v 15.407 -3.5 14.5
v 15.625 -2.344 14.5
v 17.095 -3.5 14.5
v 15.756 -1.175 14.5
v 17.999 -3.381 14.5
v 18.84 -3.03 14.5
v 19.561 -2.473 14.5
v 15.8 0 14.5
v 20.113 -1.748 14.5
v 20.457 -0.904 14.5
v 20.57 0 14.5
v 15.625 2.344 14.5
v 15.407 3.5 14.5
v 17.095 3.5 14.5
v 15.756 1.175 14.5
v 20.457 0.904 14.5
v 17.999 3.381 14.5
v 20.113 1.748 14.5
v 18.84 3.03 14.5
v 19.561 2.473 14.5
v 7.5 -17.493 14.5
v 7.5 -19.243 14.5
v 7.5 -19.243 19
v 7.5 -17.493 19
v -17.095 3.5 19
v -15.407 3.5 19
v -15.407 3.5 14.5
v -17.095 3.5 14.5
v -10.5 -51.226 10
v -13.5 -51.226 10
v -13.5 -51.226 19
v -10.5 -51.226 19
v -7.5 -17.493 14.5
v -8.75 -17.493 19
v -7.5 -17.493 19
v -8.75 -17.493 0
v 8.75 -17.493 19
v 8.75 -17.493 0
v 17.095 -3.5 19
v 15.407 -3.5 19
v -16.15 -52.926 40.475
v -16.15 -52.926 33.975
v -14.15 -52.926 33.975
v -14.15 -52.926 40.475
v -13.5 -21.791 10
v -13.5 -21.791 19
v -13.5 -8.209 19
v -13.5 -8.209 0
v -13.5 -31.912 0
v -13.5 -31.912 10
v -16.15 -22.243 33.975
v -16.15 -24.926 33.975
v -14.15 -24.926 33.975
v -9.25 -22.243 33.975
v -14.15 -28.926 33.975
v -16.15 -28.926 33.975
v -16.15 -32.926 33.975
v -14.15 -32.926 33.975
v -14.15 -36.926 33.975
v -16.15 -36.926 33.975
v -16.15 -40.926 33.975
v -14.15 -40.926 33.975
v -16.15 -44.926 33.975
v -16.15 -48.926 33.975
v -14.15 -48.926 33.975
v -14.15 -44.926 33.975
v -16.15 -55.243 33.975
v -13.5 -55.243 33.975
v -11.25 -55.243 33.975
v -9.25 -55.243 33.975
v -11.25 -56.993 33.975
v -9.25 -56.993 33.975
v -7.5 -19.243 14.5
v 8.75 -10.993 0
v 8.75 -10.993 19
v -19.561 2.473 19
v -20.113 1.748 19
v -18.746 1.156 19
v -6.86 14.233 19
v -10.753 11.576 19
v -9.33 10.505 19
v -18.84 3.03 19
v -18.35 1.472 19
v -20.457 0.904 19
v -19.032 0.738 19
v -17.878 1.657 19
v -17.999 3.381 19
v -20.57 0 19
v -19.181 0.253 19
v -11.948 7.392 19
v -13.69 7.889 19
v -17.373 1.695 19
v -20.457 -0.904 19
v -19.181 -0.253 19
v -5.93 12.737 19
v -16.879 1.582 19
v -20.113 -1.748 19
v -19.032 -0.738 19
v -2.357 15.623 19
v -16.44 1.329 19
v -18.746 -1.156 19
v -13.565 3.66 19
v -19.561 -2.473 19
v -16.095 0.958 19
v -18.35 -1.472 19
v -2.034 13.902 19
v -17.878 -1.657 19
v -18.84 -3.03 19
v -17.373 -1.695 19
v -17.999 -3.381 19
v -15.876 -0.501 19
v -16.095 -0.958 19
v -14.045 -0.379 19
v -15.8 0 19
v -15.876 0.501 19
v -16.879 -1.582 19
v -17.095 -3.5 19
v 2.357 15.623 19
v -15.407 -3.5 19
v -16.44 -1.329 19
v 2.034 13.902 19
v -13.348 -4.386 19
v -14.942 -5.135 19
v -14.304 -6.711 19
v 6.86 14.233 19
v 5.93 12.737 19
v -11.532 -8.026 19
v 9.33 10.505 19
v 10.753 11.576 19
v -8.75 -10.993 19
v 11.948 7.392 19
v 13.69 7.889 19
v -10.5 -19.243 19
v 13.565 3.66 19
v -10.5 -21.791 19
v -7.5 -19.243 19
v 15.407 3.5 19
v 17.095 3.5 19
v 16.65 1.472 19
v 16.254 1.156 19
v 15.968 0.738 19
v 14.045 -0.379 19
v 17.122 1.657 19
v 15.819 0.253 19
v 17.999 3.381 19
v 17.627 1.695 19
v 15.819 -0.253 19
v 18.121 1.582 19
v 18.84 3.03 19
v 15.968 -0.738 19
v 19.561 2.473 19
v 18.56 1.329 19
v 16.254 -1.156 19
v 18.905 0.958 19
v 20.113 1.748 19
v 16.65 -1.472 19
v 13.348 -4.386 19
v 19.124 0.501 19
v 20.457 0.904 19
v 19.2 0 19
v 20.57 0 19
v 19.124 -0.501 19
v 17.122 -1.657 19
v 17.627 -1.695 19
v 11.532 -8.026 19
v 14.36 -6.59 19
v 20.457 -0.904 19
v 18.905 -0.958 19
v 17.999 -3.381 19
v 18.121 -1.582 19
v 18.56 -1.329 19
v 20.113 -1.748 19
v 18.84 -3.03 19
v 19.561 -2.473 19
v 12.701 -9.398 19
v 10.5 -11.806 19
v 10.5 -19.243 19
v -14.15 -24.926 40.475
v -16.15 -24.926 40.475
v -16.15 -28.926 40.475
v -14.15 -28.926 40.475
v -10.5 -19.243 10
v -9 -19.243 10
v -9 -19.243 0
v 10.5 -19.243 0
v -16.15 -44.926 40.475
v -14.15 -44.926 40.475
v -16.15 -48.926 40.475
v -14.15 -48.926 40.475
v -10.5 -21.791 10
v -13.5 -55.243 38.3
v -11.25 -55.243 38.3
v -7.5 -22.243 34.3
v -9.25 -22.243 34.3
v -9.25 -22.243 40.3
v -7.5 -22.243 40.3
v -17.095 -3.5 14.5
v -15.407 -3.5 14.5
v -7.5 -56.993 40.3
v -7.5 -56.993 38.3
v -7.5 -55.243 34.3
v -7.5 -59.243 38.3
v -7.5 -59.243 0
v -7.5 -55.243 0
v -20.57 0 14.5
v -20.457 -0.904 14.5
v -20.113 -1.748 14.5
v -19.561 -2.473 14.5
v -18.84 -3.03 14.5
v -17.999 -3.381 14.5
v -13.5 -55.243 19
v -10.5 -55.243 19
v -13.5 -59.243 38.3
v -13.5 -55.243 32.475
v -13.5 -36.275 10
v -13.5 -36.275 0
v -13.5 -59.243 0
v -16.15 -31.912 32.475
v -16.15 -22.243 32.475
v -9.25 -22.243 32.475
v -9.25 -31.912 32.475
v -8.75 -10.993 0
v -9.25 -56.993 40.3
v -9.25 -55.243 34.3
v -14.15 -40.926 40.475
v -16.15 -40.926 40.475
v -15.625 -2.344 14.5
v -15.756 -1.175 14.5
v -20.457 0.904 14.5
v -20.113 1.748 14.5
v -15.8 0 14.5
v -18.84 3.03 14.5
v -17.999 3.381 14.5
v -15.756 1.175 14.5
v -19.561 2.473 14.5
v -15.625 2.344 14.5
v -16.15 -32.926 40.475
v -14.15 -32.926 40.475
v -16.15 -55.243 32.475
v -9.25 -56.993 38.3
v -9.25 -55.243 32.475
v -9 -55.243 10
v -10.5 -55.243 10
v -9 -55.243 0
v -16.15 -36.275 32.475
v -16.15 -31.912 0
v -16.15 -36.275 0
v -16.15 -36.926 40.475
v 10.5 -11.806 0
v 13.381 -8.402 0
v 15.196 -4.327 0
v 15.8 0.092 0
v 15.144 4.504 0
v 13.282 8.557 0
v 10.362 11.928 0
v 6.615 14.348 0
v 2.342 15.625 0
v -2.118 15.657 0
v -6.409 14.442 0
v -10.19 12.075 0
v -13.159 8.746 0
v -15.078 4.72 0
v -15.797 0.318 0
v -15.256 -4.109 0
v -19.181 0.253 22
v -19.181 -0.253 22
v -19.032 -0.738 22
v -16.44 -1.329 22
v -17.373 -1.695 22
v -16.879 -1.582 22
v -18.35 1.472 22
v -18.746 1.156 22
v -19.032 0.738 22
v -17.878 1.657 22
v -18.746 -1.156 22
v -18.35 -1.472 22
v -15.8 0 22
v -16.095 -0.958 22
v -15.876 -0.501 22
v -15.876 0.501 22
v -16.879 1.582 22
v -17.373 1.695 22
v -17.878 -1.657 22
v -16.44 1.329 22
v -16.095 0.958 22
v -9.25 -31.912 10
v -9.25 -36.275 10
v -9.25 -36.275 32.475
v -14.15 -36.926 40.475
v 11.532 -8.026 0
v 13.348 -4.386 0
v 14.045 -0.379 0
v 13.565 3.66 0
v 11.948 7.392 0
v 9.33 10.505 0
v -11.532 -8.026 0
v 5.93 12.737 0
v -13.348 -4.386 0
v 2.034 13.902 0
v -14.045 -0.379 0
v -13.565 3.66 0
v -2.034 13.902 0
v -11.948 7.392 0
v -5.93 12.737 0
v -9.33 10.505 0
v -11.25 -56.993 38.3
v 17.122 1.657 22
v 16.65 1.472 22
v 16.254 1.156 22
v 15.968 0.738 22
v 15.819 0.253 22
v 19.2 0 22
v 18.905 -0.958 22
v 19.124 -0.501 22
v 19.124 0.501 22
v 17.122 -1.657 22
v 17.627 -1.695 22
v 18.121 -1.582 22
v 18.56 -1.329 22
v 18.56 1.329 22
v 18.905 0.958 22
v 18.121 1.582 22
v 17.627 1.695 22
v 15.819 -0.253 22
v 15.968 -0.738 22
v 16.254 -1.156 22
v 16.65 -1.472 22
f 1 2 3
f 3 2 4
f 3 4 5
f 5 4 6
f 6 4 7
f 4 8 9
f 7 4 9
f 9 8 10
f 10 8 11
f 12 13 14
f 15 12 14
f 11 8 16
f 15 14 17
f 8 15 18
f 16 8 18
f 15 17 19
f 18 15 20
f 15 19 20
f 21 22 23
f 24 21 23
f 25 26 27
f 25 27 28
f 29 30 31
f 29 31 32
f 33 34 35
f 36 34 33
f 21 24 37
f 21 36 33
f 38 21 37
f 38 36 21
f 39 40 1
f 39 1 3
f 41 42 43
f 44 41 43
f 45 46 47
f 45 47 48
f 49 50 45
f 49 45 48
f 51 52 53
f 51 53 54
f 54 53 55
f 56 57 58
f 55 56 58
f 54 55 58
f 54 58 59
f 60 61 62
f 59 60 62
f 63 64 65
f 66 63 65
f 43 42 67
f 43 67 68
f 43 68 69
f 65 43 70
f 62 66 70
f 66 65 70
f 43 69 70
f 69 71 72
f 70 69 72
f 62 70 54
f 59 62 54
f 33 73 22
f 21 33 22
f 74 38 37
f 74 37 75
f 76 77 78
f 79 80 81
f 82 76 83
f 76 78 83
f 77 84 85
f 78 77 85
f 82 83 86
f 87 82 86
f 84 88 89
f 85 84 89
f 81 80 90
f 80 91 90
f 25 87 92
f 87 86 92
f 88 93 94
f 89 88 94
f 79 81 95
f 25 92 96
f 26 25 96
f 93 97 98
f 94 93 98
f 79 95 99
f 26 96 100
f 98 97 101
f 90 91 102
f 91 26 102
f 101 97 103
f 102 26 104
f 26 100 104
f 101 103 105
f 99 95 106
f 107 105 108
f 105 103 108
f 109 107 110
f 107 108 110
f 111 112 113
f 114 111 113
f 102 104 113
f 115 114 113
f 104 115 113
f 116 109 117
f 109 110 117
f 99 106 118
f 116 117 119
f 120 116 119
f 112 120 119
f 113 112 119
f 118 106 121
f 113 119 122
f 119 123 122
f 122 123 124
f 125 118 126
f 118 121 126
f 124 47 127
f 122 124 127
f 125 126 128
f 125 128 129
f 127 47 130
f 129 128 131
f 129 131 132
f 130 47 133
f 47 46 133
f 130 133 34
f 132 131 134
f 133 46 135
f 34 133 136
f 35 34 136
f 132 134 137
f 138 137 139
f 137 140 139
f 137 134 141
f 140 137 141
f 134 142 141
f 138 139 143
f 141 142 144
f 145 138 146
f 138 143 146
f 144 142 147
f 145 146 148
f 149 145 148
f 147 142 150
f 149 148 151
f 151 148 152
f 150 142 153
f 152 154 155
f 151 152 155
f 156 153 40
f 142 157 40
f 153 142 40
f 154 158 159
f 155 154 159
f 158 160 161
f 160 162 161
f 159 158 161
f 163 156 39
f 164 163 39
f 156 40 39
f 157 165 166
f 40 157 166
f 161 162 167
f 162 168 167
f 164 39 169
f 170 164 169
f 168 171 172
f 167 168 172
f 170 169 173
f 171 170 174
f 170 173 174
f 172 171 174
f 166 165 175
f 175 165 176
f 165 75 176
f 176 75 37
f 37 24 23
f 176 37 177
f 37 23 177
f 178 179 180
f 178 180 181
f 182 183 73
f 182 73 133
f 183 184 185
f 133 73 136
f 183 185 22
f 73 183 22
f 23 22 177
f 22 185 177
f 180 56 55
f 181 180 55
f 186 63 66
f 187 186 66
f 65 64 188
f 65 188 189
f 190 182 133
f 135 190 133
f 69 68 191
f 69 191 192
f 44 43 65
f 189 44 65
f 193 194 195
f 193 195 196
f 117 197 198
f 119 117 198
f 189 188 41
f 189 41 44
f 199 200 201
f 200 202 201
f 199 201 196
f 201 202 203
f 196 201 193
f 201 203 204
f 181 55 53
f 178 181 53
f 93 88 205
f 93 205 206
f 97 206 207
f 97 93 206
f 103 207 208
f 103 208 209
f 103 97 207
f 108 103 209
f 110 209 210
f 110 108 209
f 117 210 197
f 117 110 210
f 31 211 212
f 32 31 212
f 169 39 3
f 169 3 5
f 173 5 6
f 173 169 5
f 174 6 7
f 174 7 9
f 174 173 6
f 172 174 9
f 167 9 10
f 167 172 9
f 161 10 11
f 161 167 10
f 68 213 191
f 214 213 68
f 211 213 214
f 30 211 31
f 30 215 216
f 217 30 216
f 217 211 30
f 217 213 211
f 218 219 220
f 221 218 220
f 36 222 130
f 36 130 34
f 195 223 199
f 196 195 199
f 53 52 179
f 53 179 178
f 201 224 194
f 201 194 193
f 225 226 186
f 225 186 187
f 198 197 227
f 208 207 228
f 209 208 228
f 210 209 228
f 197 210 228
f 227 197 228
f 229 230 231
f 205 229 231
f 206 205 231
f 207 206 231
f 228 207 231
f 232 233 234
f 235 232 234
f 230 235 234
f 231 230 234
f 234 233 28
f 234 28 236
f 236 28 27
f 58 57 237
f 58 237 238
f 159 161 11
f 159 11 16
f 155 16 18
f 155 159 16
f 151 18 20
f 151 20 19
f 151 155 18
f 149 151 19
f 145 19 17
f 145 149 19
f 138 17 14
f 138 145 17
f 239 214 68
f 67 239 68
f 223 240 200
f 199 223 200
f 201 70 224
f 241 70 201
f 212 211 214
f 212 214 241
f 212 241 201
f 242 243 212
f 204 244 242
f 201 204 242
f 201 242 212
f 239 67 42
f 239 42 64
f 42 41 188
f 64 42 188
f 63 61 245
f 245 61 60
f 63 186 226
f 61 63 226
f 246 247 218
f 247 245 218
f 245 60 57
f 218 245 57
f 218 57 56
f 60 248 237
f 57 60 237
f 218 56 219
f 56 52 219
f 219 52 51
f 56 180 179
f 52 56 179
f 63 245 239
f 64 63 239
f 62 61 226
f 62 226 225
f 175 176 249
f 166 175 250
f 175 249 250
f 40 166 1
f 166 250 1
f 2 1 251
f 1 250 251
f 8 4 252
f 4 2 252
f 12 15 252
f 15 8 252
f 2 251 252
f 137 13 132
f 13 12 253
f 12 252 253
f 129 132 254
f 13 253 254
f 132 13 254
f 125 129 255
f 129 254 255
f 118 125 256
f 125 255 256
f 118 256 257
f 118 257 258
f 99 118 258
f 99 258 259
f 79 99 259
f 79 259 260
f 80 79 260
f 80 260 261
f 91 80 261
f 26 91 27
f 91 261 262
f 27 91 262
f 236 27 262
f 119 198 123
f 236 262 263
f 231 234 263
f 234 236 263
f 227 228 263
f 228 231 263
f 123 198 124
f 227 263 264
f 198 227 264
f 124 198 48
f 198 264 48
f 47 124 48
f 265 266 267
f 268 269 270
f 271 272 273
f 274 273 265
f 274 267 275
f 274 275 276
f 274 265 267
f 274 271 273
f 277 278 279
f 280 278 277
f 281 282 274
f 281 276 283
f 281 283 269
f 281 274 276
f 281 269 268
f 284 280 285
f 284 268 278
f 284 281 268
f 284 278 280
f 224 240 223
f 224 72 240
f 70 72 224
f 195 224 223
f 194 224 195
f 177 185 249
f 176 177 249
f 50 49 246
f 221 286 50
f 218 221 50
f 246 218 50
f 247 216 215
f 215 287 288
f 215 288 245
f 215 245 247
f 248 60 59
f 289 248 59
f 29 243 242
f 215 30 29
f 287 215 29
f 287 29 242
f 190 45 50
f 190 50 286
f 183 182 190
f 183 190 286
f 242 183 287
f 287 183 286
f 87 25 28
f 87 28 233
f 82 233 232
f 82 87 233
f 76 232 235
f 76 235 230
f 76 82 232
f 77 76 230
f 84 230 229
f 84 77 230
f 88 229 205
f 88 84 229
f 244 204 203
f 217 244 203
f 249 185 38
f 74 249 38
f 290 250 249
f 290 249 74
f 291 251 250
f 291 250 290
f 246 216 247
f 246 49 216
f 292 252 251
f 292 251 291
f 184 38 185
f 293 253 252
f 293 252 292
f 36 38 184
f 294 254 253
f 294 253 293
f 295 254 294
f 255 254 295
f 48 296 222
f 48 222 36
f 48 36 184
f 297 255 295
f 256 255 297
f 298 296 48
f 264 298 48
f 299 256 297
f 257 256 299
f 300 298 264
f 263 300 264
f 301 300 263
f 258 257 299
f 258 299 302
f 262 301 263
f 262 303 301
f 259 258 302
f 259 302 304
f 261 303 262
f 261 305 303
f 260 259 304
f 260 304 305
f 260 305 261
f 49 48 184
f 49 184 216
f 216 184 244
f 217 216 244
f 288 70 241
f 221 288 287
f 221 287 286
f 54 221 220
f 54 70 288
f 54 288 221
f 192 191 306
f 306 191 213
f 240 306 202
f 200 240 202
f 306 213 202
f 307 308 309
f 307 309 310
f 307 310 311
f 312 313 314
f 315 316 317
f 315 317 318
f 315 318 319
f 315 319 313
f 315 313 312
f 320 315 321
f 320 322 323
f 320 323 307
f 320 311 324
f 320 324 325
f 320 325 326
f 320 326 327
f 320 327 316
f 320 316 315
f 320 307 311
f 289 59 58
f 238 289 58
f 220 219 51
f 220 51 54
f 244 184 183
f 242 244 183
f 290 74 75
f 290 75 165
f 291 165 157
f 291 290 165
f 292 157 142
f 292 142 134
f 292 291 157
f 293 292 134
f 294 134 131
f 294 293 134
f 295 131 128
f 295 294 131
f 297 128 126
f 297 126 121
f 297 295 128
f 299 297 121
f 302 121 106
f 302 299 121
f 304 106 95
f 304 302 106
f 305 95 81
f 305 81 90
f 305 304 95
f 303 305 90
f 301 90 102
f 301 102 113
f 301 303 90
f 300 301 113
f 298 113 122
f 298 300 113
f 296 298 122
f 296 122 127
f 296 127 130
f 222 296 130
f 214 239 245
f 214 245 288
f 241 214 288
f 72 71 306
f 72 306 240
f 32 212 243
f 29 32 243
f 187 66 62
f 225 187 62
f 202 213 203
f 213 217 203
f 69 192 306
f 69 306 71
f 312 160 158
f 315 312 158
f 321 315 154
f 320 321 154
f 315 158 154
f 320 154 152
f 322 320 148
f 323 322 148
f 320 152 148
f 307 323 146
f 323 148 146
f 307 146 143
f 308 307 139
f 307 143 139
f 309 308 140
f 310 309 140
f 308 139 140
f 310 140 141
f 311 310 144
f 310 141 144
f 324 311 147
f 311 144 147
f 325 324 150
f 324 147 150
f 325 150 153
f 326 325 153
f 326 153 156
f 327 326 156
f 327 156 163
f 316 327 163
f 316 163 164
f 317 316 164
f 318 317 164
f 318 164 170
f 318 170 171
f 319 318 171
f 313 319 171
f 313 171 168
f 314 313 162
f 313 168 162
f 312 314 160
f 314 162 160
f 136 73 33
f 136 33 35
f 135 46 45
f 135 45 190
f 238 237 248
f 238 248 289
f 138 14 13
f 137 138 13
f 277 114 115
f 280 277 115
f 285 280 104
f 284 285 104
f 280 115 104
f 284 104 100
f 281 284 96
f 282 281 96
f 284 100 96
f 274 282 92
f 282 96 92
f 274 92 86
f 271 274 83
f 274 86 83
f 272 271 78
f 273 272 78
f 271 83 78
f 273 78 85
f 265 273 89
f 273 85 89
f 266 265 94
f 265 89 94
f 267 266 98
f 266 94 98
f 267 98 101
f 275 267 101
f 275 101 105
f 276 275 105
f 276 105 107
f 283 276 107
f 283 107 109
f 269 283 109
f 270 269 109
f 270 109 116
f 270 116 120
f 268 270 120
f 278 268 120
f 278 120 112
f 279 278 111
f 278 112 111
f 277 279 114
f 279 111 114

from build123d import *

# Parameters (mm, degrees)
BOSS_EXTRU_1_DEPTH      = 19
ESQUISSE2_R             = 1.7
BOSS_EXTRU_8_DEPTH      = 4.5
ESQUISSE2_4_R           = 1.7
BOSS_EXTRU_9_DEPTH      = 3
ESQUISSE5_W             = 15
ESQUISSE5_H             = 4.5
ENL_V_MAT_EXTRU_1_DEPTH = 1.75
ESQUISSE20_W            = 19
ESQUISSE20_H            = 3.718185323
BOSS_EXTRU_18_DEPTH     = 3
ESQUISSE21_W            = 3
ESQUISSE21_H            = 19
BOSS_EXTRU_19_DEPTH     = 40
ESQUISSE22_W            = 19
ESQUISSE22_H            = 4
BOSS_EXTRU_20_DEPTH     = 3
ESQUISSE23_W            = 6
ESQUISSE23_H            = 4
BOSS_EXTRU_21_DEPTH     = 19.3
ESQUISSE24_W            = 1.75
ESQUISSE24_H            = 4
BOSS_EXTRU_22_DEPTH     = 33
ESQUISSE25_W            = 2
ESQUISSE25_H            = 4.324516653
ENL_V_MAT_EXTRU_6_DEPTH = 1.75
ESQUISSE26_W            = 3.2
ESQUISSE26_H            = 1.5
BOSS_EXTRU_23_DEPTH     = 5
ESQUISSE27_W            = 1.5
ESQUISSE27_H            = 5
BOSS_EXTRU_24_DEPTH     = 3.7
BOSS_EXTRU_26_REACH     = 63.655
ESQUISSE29_W            = 3
ESQUISSE29_H            = 19
ESQUISSE30_W            = 1.499569939
ESQUISSE30_H            = 10
BOSS_EXTRU_27_DEPTH     = 36
ESQUISSE31_W            = 3
ESQUISSE31_H            = 36.935070483
ENL_V_MAT_EXTRU_7_DEPTH = 9
ESQUISSE32_W            = 3
ESQUISSE32_H            = 9
BOSS_EXTRU_28_DEPTH     = 7.5
ESQUISSE33_W            = 6.9
ESQUISSE33_H            = 1.5
BOSS_EXTRU_29_DEPTH     = 28
ESQUISSE34_W            = 6.9
ESQUISSE34_H            = 4.363408043
BOSS_EXTRU_30_DEPTH     = 22.475483347
ESQUISSE35_W            = 2.65
ESQUISSE35_H            = 4.363408043
BOSS_EXTRU_31_DEPTH     = 10
ESQUISSE36_W            = 2
ESQUISSE36_H            = 4
BOSS_EXTRU_32_DEPTH     = 6.5
ESQUISSE37_W            = 1.75
ESQUISSE37_H            = 34.75
BOSS_EXTRU_33_DEPTH     = 2


with BuildPart() as part:
    # Esquisse1 → Boss.-Extru.1 (new body)
    with BuildSketch(Plane.XY):
        with BuildLine():
            Line((-10.5, -11.806354221), (-10.5, -19.242724867))
            Line((-10.5, -19.242724867), (10.5, -19.242724867))
            Line((10.5, -19.242724867), (10.5, -11.806354221))
            ThreePointArc((10.5, -11.806354221), (0, 15.8), (-10.5, -11.806354221))
        make_face()
        with BuildLine():
            Line((-8.75, -10.992724867), (-8.75, -17.492724867))
            Line((-8.75, -17.492724867), (8.75, -17.492724867))
            Line((8.75, -17.492724867), (8.75, -10.992724867))
            ThreePointArc((8.75, -10.992724867), (0, 14.05), (-8.75, -10.992724867))
        make_face(mode=Mode.SUBTRACT)
    extrude(amount=BOSS_EXTRU_1_DEPTH)



with BuildPart() as body_2:
    # Esquisse2 → Boss.-Extru.8 (new body)
    # profile 1 of 4: a face of its own
    with BuildSketch(Plane.XY.offset(19)):
        with BuildLine():
            ThreePointArc((-15.8, 0), (-15.70155977, 1.760971547), (-15.407465723, 3.5))
            Line((-15.407465723, 3.5), (-17.095274292, 3.5))
            ThreePointArc((-17.095274292, 3.5), (-19.561128115, 2.473312424), (-20.569715298, 0))
            ThreePointArc((-20.569715298, 0), (-19.561128115, -2.473312424), (-17.095274292, -3.5))
            Line((-17.095274292, -3.5), (-15.407465723, -3.5))
            ThreePointArc((-15.407465723, -3.5), (-15.70155977, -1.760971547), (-15.8, 0))
        make_face()
        with Locations((-17.5, 0)):
            Circle(ESQUISSE2_R, mode=Mode.SUBTRACT)
    # profile 2 of 4: a face of its own
    with BuildSketch(Plane.XY.offset(19)):
        with BuildLine():
            Line((17.095274292, 3.5), (15.407465723, 3.5))
            ThreePointArc((15.407465723, 3.5), (15.70155977, 1.76097155), (15.8, 5e-09))
            ThreePointArc((15.8, 5e-09), (15.70155977, -1.760971545), (15.407465723, -3.5))
            Line((15.407465723, -3.5), (17.095274292, -3.5))
            ThreePointArc((17.095274292, -3.5), (19.561128115, -2.473312424), (20.569715298, 0))
            ThreePointArc((20.569715298, 0), (19.561128115, 2.473312424), (17.095274292, 3.5))
        make_face()
        with BuildLine():
            ThreePointArc((19.2, 0), (17.499999997, -1.7), (15.8, 5e-09))
            ThreePointArc((15.8, 5e-09), (17.500000003, 1.7), (19.2, 0))
        make_face(mode=Mode.SUBTRACT)
    # profile 3 of 4: a face of its own
    with BuildSketch(Plane.XY.offset(19)):
        with Locations((-17.5, 0)):
            Circle(ESQUISSE2_R)
    # profile 4 of 4: a face of its own
    with BuildSketch(Plane.XY.offset(19)):
        with Locations((17.5, 0)):
            Circle(ESQUISSE2_R)
    extrude(amount=-BOSS_EXTRU_8_DEPTH)


with BuildPart() as part_1:
    add(part.part)

    add(body_2.part)  # Boss.-Extru.9 merges body 2
    # Esquisse2<4> → Boss.-Extru.9 (add)
    with BuildSketch(Plane.XY.offset(19)):
        with Locations((-17.5, 0)):
            Circle(ESQUISSE2_4_R)
        with Locations((17.5, 0)):
            Circle(ESQUISSE2_4_R)
    extrude(amount=BOSS_EXTRU_9_DEPTH)

    # Esquisse5 → Enlèv. mat.-Extru.1 (cut)
    with BuildSketch(Plane.XZ.offset(19.242724867)):
        with Locations((0, 16.75)):
            Rectangle(ESQUISSE5_W, ESQUISSE5_H)
    extrude(amount=-ENL_V_MAT_EXTRU_1_DEPTH, mode=Mode.SUBTRACT)

    # Esquisse20 → Boss.-Extru.18 (add)
    with BuildSketch(Plane.ZY.offset(10.5)):
        with Locations((9.5, -17.383632205)):
            Rectangle(ESQUISSE20_W, ESQUISSE20_H)
    extrude(amount=BOSS_EXTRU_18_DEPTH)

    # Esquisse21 → Boss.-Extru.19 (add)
    with BuildSketch(Plane.XZ.offset(19.242724867)):
        with Locations((-12, 9.5)):
            Rectangle(ESQUISSE21_W, ESQUISSE21_H)
    extrude(amount=BOSS_EXTRU_19_DEPTH)

    # Esquisse22 → Boss.-Extru.20 (add)
    with BuildSketch(Plane(origin=(-10.5, 0, 0), x_dir=(0, 0, -1), z_dir=(1, 0, 0))):
        with Locations((-9.5, -57.242724867)):
            Rectangle(ESQUISSE22_W, ESQUISSE22_H)
    extrude(amount=BOSS_EXTRU_20_DEPTH)

    # Esquisse23 → Boss.-Extru.21 (add)
    with BuildSketch(Plane.XY.offset(19)):
        with Locations((-10.5, -57.242724867)):
            Rectangle(ESQUISSE23_W, ESQUISSE23_H)
    extrude(amount=BOSS_EXTRU_21_DEPTH)

    # Esquisse24 → Boss.-Extru.22 (add)
    with BuildSketch(Plane(origin=(0, -55.242724867, 0), x_dir=(1, 0, 0), z_dir=(0, 1, 0))):
        with Locations((-8.375, -36.3)):
            Rectangle(ESQUISSE24_W, ESQUISSE24_H)
    extrude(amount=BOSS_EXTRU_22_DEPTH)

    # Esquisse25 → Enlèv. mat.-Extru.6 (cut)
    with BuildSketch(Plane(origin=(0, -55.242724867, 0), x_dir=(1, 0, 0), z_dir=(0, 1, 0))):
        with Locations((-10.25, -36.137741674)):
            Rectangle(ESQUISSE25_W, ESQUISSE25_H)
    extrude(amount=-ENL_V_MAT_EXTRU_6_DEPTH, mode=Mode.SUBTRACT)

    # Esquisse26 → Boss.-Extru.23 (add)
    with BuildSketch(Plane(origin=(0, -55.242724867, 0), x_dir=(1, 0, 0), z_dir=(0, 1, 0))):
        with Locations((-10.85, -33.225483347)):
            Rectangle(ESQUISSE26_W, ESQUISSE26_H)
    extrude(amount=BOSS_EXTRU_23_DEPTH)

    # Esquisse27 → Boss.-Extru.24 (add)
    with BuildSketch(Plane.ZY.offset(12.45)):
        with Locations((33.225483347, -52.742724867)):
            Rectangle(ESQUISSE27_W, ESQUISSE27_H)
    extrude(amount=BOSS_EXTRU_24_DEPTH)

    # Esquisse29 → Boss.-Extru.26 (add, up to next)
    with BuildSketch(Plane(origin=(0, -15.524539544, 0), x_dir=(1, 0, 0), z_dir=(0, 1, 0)), mode=Mode.PRIVATE) as boss_extru_26_sk1:
        with Locations((-12, -9.5)):
            Rectangle(ESQUISSE29_W, ESQUISSE29_H)
    boss_extru_26_tool1 = extrude(boss_extru_26_sk1.sketch, amount=BOSS_EXTRU_26_REACH, mode=Mode.PRIVATE) - part_1.part
    add(boss_extru_26_tool1.solids().sort_by_distance((-12, -15.52454, 9.5))[0])

    # Esquisse30 → Boss.-Extru.27 (add)
    with BuildSketch(Plane.XZ.offset(19.242724867)):
        with Locations((-9.750215031, 5)):
            Rectangle(ESQUISSE30_W, ESQUISSE30_H)
    extrude(amount=BOSS_EXTRU_27_DEPTH)

    # Esquisse31 → Enlèv. mat.-Extru.7 (cut)
    with BuildSketch(Plane.XY.offset(19)):
        with Locations((-12, -40.258799307)):
            Rectangle(ESQUISSE31_W, ESQUISSE31_H)
    extrude(amount=-ENL_V_MAT_EXTRU_7_DEPTH, mode=Mode.SUBTRACT)

    # Esquisse32 → Boss.-Extru.28 (add)
    with BuildSketch(Plane(origin=(0, -58.726334549, 0), x_dir=(1, 0, 0), z_dir=(0, 1, 0))):
        with Locations((-12, -14.5)):
            Rectangle(ESQUISSE32_W, ESQUISSE32_H)
    extrude(amount=BOSS_EXTRU_28_DEPTH)

    # Esquisse33 → Boss.-Extru.29 (add)
    with BuildSketch(Plane(origin=(0, -50.242724867, 0), x_dir=(1, 0, 0), z_dir=(0, 1, 0))):
        with Locations((-12.7, -33.225483347)):
            Rectangle(ESQUISSE33_W, ESQUISSE33_H)
    extrude(amount=BOSS_EXTRU_29_DEPTH)

    # Esquisse34 → Boss.-Extru.30 (add)
    with BuildSketch(Plane(origin=(0, 0, 32.475483347), x_dir=(-1, 0, 0), z_dir=(0, 0, -1))):
        with Locations((12.7, -34.093482268)):
            Rectangle(ESQUISSE34_W, ESQUISSE34_H)
    extrude(amount=BOSS_EXTRU_30_DEPTH)

    # Esquisse35 → Boss.-Extru.31 (add)
    with BuildSketch(Plane(origin=(0, 0, 10), x_dir=(-1, 0, 0), z_dir=(0, 0, -1))):
        with Locations((14.825, -34.093482268)):
            Rectangle(ESQUISSE35_W, ESQUISSE35_H)
    extrude(amount=BOSS_EXTRU_31_DEPTH)

    # Esquisse36 → Boss.-Extru.32 (add)
    with BuildSketch(Plane.XY.offset(33.975483347)):
        with Locations((-15.15, -26.925726739)):
            Rectangle(ESQUISSE36_W, ESQUISSE36_H)
        with Locations((-15.15, -34.925726739)):
            Rectangle(ESQUISSE36_W, ESQUISSE36_H)
        with Locations((-15.15, -42.925726739)):
            Rectangle(ESQUISSE36_W, ESQUISSE36_H)
        with Locations((-15.15, -50.925726739)):
            Rectangle(ESQUISSE36_W, ESQUISSE36_H)
    extrude(amount=BOSS_EXTRU_32_DEPTH)

    # Esquisse37 → Boss.-Extru.33 (add)
    with BuildSketch(Plane.XY.offset(38.3)):
        with Locations((-8.375, -39.617724867)):
            Rectangle(ESQUISSE37_W, ESQUISSE37_H)
    extrude(amount=BOSS_EXTRU_33_DEPTH)


solid = part_1.part
